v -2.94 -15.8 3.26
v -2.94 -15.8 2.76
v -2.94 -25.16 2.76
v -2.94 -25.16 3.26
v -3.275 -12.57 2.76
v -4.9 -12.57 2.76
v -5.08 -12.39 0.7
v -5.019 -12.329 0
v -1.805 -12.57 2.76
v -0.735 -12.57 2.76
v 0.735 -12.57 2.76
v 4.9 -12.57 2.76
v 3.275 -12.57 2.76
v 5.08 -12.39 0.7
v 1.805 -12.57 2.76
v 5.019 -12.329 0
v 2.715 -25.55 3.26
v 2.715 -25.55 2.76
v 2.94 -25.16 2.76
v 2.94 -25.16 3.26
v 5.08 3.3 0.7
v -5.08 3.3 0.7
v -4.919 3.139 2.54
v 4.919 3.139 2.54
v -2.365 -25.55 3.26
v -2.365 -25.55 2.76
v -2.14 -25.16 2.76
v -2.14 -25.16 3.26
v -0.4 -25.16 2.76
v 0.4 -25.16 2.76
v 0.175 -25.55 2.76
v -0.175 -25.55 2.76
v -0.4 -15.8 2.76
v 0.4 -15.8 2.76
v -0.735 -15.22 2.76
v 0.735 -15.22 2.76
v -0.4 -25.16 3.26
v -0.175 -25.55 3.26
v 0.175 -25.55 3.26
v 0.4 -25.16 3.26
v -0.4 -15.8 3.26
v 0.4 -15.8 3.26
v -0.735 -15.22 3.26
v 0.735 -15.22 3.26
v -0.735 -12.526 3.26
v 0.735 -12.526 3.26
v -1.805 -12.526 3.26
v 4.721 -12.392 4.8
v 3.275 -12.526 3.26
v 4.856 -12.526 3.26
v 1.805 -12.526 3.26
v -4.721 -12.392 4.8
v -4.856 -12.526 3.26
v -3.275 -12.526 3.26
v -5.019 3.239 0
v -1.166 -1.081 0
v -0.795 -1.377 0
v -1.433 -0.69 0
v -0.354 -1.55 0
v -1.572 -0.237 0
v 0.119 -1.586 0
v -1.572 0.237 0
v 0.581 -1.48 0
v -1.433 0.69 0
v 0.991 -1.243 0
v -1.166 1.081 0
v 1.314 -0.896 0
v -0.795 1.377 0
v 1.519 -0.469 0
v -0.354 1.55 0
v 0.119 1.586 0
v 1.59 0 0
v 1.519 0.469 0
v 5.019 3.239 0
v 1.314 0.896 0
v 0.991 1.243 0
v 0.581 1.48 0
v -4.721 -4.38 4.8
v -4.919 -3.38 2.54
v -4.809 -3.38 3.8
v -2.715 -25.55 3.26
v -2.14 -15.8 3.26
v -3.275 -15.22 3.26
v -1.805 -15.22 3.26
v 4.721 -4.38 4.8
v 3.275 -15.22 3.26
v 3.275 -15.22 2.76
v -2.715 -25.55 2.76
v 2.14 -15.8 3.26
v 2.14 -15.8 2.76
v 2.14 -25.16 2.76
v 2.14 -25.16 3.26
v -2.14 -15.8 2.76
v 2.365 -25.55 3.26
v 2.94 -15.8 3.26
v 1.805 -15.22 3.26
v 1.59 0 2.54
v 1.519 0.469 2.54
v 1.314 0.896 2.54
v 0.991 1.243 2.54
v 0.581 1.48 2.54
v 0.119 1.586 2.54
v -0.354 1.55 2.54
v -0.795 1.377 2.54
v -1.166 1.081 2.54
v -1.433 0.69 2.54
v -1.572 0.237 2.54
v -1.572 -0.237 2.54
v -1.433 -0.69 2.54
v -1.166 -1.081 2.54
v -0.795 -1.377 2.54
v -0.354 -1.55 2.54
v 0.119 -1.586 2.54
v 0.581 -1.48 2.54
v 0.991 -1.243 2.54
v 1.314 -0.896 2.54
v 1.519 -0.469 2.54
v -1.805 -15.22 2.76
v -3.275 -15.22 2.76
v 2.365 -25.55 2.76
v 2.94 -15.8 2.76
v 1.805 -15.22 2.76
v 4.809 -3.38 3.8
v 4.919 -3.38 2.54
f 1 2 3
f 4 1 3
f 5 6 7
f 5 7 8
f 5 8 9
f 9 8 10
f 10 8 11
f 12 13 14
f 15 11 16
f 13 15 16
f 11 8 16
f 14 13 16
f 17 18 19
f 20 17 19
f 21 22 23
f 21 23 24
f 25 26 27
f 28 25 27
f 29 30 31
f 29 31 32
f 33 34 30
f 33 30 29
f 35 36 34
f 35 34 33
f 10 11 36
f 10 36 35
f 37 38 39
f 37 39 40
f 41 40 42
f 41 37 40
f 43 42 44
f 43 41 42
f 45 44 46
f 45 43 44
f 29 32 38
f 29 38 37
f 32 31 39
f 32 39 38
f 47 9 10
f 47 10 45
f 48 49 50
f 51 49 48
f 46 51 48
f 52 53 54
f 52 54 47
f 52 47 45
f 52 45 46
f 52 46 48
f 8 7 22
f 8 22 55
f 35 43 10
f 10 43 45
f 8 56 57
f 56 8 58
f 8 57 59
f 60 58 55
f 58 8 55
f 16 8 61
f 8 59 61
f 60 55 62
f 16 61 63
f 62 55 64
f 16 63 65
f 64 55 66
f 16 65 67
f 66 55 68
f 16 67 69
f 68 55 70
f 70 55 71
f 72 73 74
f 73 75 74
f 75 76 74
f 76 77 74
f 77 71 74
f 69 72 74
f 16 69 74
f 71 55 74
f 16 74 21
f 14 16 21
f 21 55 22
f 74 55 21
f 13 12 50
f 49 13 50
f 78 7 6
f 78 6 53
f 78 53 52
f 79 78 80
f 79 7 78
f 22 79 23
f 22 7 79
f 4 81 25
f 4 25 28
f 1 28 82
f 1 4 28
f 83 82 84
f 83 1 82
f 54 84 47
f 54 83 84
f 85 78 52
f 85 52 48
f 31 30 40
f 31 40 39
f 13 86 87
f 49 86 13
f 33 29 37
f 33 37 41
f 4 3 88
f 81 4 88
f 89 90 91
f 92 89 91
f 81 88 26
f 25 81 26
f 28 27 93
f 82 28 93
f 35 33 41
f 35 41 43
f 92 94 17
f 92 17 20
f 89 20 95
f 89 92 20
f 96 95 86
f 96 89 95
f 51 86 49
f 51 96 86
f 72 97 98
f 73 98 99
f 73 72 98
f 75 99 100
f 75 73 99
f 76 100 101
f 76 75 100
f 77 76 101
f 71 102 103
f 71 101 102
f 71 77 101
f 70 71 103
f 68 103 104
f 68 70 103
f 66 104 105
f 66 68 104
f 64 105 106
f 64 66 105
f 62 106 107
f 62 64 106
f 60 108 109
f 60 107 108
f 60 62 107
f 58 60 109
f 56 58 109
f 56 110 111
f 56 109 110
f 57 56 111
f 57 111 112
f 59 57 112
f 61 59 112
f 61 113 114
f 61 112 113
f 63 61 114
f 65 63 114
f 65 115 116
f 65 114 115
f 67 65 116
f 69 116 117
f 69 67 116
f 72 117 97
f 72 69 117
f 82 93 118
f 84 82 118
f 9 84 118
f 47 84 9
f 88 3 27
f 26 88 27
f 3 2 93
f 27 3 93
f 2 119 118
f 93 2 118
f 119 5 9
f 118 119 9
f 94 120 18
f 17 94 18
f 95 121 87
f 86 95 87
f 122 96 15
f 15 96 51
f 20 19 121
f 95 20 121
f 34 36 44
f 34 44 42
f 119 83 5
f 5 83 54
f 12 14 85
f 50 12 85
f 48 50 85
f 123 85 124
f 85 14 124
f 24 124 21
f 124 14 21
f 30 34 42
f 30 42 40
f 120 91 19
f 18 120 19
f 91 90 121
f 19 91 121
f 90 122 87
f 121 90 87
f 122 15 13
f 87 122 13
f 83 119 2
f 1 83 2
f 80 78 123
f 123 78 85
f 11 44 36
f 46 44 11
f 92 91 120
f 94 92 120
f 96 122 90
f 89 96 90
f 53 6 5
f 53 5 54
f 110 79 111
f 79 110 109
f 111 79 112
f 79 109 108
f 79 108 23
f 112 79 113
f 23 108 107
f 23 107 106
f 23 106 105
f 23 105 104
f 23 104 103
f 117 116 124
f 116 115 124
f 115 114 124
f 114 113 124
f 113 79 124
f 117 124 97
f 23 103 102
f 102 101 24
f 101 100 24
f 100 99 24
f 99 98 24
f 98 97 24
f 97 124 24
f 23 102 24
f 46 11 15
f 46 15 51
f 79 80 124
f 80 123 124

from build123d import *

# Parameters (mm, degrees)
SKETCH1_W          = 10.16
SKETCH1_H          = 15.87
SKETCH1_R          = 1.59
EXTRUDE1_DEPTH     = 4.8
SKETCH2_W          = 4.533761675
SKETCH2_H          = 11.038854263
CUT_EXTRUDE1_DEPTH = 5.5
CHAMFER1_SIZE      = 1
EXTRUDE2_DEPTH     = 0.5
DRAFT1_START       = -14
DRAFT1_DEPTH       = 17.3
DRAFT1_START_2     = 3.226433484
DRAFT1_2_OUTLINE_W = 14
DRAFT1_2_OUTLINE_H = 3
DRAFT1_2_DEPTH     = 0.773566516
DRAFT2_ANGLE       = -5
DRAFT4_START       = -5.08
DRAFT4_DEPTH       = 10.16
DRAFT4_2_DEPTH     = 1.805
DRAFT4_START_2     = 3.275
DRAFT4_3_DEPTH     = 1.805
DRAFT4_START_3     = -1.805
DRAFT4_4_DEPTH     = 1.07
DRAFT4_START_4     = 0.735
DRAFT4_5_DEPTH     = 1.07
DRAFT3_ANGLE       = 5


with BuildPart() as part:
    # Sketch1 → Extrude1 (new body)
    with BuildSketch(Plane.XY):
        with Locations((0, -4.635)):
            Rectangle(SKETCH1_W, SKETCH1_H)
        Circle(SKETCH1_R, mode=Mode.SUBTRACT)
    extrude(amount=EXTRUDE1_DEPTH)

    # Sketch2 → Cut-Extrude1 (cut, symmetric)
    with BuildSketch(Plane(origin=(0, 0, 0), x_dir=(0, 0, -1), z_dir=(1, 0, 0))):
        with Locations((-4.806880837, 2.139427131)):
            Rectangle(SKETCH2_W, SKETCH2_H)
    extrude(amount=CUT_EXTRUDE1_DEPTH, both=True, mode=Mode.SUBTRACT)

    # Chamfer1
    chamfer1_edges = [part.edges().sort_by_distance(p)[0] for p in [
        (0, -3.38, 4.8),
    ]]
    chamfer(chamfer1_edges, length=CHAMFER1_SIZE)

    # Sketch3 → Extrude2 (add)
    with BuildSketch(Plane.XY.offset(2.76)):
        Polygon((0.735, -12.57), (0.735, -15.219762979), (0.4, -15.8), (0.4, -25.160288568), (0.175, -25.55), (-0.175, -25.55), (-0.4, -25.160288568), (-0.4, -15.8), (-0.735, -15.219762979), (-0.735, -12.57), align=None)
        Polygon((3.275, -12.57), (1.805, -12.57), (1.805, -15.219762979), (2.14, -15.8), (2.14, -25.160288568), (2.365, -25.55), (2.715, -25.55), (2.94, -25.160288568), (2.94, -15.8), (3.275, -15.219762979), align=None)
        Polygon((-1.805, -12.57), (-3.275, -12.57), (-3.275, -15.219762979), (-2.94, -15.8), (-2.94, -25.160288568), (-2.715, -25.55), (-2.365, -25.55), (-2.14, -25.160288568), (-2.14, -15.8), (-1.805, -15.219762979), align=None)
    extrude(amount=EXTRUDE2_DEPTH)

    # Draft1: read off the stored shape, not the designer's step
    # Draft1 outline → Draft1 (cut)
    with BuildSketch(Plane(origin=(0, 0, 0), x_dir=(1, 0, 0), z_dir=(0, 1, 0)).offset(DRAFT1_START)):
        Polygon((5.08, 0), (5.018757936, 0), (5.08, -0.7), align=None)
        Polygon((-5.08, -0.7), (-5.018757936, 0), (-5.08, 0), align=None)
    extrude(amount=DRAFT1_DEPTH, mode=Mode.SUBTRACT)

    # Draft1 2 outline → Draft1 2 (cut)
    with BuildSketch(Plane(origin=(0, 0, 0), x_dir=(1, 0, 0), z_dir=(0, 0.9961946980917455, -0.08715574274765836)).offset(DRAFT1_START_2)):
        with Locations((0, -0.5)):
            Rectangle(DRAFT1_2_OUTLINE_W, DRAFT1_2_OUTLINE_H)
    extrude(amount=DRAFT1_2_DEPTH, mode=Mode.SUBTRACT)

    # Draft2
    draft2_faces = [part.faces().sort_by_distance(p)[0] for p in [
        (5.08, -6.046569578, 2.451893477),
        (-5.08, -6.046569578, 2.451893477),
        (0, 3.3, 1.62),
    ]]
    draft(draft2_faces, Plane(origin=(0, 0, 0.7), x_dir=(-1, 0, 0), z_dir=(0, 0, -1)), DRAFT2_ANGLE)

    # Draft4: read off the stored shape, not the designer's step
    # Draft4 outline → Draft4 (cut)
    with BuildSketch(Plane.YZ.offset(DRAFT4_START)):
        Polygon((-12.526255668, 3.26), (-12.391523126, 4.8), (-12.57, 4.8), (-12.57, 3.26), align=None)
    extrude(amount=DRAFT4_DEPTH, mode=Mode.SUBTRACT)

    # Draft4 2 outline → Draft4 2 (cut)
    with BuildSketch(Plane.YZ.offset(DRAFT4_START)):
        Polygon((-12.57, 2.76), (-12.526255668, 3.26), (-12.57, 3.26), align=None)
    extrude(amount=DRAFT4_2_DEPTH, mode=Mode.SUBTRACT)

    # Draft4 3 outline → Draft4 3 (cut)
    with BuildSketch(Plane.YZ.offset(DRAFT4_START_2)):
        Polygon((-12.57, 2.76), (-12.526255668, 3.26), (-12.57, 3.26), align=None)
    extrude(amount=DRAFT4_3_DEPTH, mode=Mode.SUBTRACT)

    # Draft4 4 outline → Draft4 4 (cut)
    with BuildSketch(Plane.YZ.offset(DRAFT4_START_3)):
        Polygon((-12.57, 2.76), (-12.526255668, 3.26), (-12.57, 3.26), align=None)
    extrude(amount=DRAFT4_4_DEPTH, mode=Mode.SUBTRACT)

    # Draft4 5 outline → Draft4 5 (cut)
    with BuildSketch(Plane.YZ.offset(DRAFT4_START_4)):
        Polygon((-12.57, 2.76), (-12.526255668, 3.26), (-12.57, 3.26), align=None)
    extrude(amount=DRAFT4_5_DEPTH, mode=Mode.SUBTRACT)

    # Draft3
    draft3_faces = [part.faces().sort_by_distance(p)[0] for p in [
        (0, -12.57, 1.372462039),
    ]]
    draft(draft3_faces, Plane(origin=(0, 0, 2.76), x_dir=(-1, 0, 0), z_dir=(0, 0, -1)), DRAFT3_ANGLE)


solid = part.part
